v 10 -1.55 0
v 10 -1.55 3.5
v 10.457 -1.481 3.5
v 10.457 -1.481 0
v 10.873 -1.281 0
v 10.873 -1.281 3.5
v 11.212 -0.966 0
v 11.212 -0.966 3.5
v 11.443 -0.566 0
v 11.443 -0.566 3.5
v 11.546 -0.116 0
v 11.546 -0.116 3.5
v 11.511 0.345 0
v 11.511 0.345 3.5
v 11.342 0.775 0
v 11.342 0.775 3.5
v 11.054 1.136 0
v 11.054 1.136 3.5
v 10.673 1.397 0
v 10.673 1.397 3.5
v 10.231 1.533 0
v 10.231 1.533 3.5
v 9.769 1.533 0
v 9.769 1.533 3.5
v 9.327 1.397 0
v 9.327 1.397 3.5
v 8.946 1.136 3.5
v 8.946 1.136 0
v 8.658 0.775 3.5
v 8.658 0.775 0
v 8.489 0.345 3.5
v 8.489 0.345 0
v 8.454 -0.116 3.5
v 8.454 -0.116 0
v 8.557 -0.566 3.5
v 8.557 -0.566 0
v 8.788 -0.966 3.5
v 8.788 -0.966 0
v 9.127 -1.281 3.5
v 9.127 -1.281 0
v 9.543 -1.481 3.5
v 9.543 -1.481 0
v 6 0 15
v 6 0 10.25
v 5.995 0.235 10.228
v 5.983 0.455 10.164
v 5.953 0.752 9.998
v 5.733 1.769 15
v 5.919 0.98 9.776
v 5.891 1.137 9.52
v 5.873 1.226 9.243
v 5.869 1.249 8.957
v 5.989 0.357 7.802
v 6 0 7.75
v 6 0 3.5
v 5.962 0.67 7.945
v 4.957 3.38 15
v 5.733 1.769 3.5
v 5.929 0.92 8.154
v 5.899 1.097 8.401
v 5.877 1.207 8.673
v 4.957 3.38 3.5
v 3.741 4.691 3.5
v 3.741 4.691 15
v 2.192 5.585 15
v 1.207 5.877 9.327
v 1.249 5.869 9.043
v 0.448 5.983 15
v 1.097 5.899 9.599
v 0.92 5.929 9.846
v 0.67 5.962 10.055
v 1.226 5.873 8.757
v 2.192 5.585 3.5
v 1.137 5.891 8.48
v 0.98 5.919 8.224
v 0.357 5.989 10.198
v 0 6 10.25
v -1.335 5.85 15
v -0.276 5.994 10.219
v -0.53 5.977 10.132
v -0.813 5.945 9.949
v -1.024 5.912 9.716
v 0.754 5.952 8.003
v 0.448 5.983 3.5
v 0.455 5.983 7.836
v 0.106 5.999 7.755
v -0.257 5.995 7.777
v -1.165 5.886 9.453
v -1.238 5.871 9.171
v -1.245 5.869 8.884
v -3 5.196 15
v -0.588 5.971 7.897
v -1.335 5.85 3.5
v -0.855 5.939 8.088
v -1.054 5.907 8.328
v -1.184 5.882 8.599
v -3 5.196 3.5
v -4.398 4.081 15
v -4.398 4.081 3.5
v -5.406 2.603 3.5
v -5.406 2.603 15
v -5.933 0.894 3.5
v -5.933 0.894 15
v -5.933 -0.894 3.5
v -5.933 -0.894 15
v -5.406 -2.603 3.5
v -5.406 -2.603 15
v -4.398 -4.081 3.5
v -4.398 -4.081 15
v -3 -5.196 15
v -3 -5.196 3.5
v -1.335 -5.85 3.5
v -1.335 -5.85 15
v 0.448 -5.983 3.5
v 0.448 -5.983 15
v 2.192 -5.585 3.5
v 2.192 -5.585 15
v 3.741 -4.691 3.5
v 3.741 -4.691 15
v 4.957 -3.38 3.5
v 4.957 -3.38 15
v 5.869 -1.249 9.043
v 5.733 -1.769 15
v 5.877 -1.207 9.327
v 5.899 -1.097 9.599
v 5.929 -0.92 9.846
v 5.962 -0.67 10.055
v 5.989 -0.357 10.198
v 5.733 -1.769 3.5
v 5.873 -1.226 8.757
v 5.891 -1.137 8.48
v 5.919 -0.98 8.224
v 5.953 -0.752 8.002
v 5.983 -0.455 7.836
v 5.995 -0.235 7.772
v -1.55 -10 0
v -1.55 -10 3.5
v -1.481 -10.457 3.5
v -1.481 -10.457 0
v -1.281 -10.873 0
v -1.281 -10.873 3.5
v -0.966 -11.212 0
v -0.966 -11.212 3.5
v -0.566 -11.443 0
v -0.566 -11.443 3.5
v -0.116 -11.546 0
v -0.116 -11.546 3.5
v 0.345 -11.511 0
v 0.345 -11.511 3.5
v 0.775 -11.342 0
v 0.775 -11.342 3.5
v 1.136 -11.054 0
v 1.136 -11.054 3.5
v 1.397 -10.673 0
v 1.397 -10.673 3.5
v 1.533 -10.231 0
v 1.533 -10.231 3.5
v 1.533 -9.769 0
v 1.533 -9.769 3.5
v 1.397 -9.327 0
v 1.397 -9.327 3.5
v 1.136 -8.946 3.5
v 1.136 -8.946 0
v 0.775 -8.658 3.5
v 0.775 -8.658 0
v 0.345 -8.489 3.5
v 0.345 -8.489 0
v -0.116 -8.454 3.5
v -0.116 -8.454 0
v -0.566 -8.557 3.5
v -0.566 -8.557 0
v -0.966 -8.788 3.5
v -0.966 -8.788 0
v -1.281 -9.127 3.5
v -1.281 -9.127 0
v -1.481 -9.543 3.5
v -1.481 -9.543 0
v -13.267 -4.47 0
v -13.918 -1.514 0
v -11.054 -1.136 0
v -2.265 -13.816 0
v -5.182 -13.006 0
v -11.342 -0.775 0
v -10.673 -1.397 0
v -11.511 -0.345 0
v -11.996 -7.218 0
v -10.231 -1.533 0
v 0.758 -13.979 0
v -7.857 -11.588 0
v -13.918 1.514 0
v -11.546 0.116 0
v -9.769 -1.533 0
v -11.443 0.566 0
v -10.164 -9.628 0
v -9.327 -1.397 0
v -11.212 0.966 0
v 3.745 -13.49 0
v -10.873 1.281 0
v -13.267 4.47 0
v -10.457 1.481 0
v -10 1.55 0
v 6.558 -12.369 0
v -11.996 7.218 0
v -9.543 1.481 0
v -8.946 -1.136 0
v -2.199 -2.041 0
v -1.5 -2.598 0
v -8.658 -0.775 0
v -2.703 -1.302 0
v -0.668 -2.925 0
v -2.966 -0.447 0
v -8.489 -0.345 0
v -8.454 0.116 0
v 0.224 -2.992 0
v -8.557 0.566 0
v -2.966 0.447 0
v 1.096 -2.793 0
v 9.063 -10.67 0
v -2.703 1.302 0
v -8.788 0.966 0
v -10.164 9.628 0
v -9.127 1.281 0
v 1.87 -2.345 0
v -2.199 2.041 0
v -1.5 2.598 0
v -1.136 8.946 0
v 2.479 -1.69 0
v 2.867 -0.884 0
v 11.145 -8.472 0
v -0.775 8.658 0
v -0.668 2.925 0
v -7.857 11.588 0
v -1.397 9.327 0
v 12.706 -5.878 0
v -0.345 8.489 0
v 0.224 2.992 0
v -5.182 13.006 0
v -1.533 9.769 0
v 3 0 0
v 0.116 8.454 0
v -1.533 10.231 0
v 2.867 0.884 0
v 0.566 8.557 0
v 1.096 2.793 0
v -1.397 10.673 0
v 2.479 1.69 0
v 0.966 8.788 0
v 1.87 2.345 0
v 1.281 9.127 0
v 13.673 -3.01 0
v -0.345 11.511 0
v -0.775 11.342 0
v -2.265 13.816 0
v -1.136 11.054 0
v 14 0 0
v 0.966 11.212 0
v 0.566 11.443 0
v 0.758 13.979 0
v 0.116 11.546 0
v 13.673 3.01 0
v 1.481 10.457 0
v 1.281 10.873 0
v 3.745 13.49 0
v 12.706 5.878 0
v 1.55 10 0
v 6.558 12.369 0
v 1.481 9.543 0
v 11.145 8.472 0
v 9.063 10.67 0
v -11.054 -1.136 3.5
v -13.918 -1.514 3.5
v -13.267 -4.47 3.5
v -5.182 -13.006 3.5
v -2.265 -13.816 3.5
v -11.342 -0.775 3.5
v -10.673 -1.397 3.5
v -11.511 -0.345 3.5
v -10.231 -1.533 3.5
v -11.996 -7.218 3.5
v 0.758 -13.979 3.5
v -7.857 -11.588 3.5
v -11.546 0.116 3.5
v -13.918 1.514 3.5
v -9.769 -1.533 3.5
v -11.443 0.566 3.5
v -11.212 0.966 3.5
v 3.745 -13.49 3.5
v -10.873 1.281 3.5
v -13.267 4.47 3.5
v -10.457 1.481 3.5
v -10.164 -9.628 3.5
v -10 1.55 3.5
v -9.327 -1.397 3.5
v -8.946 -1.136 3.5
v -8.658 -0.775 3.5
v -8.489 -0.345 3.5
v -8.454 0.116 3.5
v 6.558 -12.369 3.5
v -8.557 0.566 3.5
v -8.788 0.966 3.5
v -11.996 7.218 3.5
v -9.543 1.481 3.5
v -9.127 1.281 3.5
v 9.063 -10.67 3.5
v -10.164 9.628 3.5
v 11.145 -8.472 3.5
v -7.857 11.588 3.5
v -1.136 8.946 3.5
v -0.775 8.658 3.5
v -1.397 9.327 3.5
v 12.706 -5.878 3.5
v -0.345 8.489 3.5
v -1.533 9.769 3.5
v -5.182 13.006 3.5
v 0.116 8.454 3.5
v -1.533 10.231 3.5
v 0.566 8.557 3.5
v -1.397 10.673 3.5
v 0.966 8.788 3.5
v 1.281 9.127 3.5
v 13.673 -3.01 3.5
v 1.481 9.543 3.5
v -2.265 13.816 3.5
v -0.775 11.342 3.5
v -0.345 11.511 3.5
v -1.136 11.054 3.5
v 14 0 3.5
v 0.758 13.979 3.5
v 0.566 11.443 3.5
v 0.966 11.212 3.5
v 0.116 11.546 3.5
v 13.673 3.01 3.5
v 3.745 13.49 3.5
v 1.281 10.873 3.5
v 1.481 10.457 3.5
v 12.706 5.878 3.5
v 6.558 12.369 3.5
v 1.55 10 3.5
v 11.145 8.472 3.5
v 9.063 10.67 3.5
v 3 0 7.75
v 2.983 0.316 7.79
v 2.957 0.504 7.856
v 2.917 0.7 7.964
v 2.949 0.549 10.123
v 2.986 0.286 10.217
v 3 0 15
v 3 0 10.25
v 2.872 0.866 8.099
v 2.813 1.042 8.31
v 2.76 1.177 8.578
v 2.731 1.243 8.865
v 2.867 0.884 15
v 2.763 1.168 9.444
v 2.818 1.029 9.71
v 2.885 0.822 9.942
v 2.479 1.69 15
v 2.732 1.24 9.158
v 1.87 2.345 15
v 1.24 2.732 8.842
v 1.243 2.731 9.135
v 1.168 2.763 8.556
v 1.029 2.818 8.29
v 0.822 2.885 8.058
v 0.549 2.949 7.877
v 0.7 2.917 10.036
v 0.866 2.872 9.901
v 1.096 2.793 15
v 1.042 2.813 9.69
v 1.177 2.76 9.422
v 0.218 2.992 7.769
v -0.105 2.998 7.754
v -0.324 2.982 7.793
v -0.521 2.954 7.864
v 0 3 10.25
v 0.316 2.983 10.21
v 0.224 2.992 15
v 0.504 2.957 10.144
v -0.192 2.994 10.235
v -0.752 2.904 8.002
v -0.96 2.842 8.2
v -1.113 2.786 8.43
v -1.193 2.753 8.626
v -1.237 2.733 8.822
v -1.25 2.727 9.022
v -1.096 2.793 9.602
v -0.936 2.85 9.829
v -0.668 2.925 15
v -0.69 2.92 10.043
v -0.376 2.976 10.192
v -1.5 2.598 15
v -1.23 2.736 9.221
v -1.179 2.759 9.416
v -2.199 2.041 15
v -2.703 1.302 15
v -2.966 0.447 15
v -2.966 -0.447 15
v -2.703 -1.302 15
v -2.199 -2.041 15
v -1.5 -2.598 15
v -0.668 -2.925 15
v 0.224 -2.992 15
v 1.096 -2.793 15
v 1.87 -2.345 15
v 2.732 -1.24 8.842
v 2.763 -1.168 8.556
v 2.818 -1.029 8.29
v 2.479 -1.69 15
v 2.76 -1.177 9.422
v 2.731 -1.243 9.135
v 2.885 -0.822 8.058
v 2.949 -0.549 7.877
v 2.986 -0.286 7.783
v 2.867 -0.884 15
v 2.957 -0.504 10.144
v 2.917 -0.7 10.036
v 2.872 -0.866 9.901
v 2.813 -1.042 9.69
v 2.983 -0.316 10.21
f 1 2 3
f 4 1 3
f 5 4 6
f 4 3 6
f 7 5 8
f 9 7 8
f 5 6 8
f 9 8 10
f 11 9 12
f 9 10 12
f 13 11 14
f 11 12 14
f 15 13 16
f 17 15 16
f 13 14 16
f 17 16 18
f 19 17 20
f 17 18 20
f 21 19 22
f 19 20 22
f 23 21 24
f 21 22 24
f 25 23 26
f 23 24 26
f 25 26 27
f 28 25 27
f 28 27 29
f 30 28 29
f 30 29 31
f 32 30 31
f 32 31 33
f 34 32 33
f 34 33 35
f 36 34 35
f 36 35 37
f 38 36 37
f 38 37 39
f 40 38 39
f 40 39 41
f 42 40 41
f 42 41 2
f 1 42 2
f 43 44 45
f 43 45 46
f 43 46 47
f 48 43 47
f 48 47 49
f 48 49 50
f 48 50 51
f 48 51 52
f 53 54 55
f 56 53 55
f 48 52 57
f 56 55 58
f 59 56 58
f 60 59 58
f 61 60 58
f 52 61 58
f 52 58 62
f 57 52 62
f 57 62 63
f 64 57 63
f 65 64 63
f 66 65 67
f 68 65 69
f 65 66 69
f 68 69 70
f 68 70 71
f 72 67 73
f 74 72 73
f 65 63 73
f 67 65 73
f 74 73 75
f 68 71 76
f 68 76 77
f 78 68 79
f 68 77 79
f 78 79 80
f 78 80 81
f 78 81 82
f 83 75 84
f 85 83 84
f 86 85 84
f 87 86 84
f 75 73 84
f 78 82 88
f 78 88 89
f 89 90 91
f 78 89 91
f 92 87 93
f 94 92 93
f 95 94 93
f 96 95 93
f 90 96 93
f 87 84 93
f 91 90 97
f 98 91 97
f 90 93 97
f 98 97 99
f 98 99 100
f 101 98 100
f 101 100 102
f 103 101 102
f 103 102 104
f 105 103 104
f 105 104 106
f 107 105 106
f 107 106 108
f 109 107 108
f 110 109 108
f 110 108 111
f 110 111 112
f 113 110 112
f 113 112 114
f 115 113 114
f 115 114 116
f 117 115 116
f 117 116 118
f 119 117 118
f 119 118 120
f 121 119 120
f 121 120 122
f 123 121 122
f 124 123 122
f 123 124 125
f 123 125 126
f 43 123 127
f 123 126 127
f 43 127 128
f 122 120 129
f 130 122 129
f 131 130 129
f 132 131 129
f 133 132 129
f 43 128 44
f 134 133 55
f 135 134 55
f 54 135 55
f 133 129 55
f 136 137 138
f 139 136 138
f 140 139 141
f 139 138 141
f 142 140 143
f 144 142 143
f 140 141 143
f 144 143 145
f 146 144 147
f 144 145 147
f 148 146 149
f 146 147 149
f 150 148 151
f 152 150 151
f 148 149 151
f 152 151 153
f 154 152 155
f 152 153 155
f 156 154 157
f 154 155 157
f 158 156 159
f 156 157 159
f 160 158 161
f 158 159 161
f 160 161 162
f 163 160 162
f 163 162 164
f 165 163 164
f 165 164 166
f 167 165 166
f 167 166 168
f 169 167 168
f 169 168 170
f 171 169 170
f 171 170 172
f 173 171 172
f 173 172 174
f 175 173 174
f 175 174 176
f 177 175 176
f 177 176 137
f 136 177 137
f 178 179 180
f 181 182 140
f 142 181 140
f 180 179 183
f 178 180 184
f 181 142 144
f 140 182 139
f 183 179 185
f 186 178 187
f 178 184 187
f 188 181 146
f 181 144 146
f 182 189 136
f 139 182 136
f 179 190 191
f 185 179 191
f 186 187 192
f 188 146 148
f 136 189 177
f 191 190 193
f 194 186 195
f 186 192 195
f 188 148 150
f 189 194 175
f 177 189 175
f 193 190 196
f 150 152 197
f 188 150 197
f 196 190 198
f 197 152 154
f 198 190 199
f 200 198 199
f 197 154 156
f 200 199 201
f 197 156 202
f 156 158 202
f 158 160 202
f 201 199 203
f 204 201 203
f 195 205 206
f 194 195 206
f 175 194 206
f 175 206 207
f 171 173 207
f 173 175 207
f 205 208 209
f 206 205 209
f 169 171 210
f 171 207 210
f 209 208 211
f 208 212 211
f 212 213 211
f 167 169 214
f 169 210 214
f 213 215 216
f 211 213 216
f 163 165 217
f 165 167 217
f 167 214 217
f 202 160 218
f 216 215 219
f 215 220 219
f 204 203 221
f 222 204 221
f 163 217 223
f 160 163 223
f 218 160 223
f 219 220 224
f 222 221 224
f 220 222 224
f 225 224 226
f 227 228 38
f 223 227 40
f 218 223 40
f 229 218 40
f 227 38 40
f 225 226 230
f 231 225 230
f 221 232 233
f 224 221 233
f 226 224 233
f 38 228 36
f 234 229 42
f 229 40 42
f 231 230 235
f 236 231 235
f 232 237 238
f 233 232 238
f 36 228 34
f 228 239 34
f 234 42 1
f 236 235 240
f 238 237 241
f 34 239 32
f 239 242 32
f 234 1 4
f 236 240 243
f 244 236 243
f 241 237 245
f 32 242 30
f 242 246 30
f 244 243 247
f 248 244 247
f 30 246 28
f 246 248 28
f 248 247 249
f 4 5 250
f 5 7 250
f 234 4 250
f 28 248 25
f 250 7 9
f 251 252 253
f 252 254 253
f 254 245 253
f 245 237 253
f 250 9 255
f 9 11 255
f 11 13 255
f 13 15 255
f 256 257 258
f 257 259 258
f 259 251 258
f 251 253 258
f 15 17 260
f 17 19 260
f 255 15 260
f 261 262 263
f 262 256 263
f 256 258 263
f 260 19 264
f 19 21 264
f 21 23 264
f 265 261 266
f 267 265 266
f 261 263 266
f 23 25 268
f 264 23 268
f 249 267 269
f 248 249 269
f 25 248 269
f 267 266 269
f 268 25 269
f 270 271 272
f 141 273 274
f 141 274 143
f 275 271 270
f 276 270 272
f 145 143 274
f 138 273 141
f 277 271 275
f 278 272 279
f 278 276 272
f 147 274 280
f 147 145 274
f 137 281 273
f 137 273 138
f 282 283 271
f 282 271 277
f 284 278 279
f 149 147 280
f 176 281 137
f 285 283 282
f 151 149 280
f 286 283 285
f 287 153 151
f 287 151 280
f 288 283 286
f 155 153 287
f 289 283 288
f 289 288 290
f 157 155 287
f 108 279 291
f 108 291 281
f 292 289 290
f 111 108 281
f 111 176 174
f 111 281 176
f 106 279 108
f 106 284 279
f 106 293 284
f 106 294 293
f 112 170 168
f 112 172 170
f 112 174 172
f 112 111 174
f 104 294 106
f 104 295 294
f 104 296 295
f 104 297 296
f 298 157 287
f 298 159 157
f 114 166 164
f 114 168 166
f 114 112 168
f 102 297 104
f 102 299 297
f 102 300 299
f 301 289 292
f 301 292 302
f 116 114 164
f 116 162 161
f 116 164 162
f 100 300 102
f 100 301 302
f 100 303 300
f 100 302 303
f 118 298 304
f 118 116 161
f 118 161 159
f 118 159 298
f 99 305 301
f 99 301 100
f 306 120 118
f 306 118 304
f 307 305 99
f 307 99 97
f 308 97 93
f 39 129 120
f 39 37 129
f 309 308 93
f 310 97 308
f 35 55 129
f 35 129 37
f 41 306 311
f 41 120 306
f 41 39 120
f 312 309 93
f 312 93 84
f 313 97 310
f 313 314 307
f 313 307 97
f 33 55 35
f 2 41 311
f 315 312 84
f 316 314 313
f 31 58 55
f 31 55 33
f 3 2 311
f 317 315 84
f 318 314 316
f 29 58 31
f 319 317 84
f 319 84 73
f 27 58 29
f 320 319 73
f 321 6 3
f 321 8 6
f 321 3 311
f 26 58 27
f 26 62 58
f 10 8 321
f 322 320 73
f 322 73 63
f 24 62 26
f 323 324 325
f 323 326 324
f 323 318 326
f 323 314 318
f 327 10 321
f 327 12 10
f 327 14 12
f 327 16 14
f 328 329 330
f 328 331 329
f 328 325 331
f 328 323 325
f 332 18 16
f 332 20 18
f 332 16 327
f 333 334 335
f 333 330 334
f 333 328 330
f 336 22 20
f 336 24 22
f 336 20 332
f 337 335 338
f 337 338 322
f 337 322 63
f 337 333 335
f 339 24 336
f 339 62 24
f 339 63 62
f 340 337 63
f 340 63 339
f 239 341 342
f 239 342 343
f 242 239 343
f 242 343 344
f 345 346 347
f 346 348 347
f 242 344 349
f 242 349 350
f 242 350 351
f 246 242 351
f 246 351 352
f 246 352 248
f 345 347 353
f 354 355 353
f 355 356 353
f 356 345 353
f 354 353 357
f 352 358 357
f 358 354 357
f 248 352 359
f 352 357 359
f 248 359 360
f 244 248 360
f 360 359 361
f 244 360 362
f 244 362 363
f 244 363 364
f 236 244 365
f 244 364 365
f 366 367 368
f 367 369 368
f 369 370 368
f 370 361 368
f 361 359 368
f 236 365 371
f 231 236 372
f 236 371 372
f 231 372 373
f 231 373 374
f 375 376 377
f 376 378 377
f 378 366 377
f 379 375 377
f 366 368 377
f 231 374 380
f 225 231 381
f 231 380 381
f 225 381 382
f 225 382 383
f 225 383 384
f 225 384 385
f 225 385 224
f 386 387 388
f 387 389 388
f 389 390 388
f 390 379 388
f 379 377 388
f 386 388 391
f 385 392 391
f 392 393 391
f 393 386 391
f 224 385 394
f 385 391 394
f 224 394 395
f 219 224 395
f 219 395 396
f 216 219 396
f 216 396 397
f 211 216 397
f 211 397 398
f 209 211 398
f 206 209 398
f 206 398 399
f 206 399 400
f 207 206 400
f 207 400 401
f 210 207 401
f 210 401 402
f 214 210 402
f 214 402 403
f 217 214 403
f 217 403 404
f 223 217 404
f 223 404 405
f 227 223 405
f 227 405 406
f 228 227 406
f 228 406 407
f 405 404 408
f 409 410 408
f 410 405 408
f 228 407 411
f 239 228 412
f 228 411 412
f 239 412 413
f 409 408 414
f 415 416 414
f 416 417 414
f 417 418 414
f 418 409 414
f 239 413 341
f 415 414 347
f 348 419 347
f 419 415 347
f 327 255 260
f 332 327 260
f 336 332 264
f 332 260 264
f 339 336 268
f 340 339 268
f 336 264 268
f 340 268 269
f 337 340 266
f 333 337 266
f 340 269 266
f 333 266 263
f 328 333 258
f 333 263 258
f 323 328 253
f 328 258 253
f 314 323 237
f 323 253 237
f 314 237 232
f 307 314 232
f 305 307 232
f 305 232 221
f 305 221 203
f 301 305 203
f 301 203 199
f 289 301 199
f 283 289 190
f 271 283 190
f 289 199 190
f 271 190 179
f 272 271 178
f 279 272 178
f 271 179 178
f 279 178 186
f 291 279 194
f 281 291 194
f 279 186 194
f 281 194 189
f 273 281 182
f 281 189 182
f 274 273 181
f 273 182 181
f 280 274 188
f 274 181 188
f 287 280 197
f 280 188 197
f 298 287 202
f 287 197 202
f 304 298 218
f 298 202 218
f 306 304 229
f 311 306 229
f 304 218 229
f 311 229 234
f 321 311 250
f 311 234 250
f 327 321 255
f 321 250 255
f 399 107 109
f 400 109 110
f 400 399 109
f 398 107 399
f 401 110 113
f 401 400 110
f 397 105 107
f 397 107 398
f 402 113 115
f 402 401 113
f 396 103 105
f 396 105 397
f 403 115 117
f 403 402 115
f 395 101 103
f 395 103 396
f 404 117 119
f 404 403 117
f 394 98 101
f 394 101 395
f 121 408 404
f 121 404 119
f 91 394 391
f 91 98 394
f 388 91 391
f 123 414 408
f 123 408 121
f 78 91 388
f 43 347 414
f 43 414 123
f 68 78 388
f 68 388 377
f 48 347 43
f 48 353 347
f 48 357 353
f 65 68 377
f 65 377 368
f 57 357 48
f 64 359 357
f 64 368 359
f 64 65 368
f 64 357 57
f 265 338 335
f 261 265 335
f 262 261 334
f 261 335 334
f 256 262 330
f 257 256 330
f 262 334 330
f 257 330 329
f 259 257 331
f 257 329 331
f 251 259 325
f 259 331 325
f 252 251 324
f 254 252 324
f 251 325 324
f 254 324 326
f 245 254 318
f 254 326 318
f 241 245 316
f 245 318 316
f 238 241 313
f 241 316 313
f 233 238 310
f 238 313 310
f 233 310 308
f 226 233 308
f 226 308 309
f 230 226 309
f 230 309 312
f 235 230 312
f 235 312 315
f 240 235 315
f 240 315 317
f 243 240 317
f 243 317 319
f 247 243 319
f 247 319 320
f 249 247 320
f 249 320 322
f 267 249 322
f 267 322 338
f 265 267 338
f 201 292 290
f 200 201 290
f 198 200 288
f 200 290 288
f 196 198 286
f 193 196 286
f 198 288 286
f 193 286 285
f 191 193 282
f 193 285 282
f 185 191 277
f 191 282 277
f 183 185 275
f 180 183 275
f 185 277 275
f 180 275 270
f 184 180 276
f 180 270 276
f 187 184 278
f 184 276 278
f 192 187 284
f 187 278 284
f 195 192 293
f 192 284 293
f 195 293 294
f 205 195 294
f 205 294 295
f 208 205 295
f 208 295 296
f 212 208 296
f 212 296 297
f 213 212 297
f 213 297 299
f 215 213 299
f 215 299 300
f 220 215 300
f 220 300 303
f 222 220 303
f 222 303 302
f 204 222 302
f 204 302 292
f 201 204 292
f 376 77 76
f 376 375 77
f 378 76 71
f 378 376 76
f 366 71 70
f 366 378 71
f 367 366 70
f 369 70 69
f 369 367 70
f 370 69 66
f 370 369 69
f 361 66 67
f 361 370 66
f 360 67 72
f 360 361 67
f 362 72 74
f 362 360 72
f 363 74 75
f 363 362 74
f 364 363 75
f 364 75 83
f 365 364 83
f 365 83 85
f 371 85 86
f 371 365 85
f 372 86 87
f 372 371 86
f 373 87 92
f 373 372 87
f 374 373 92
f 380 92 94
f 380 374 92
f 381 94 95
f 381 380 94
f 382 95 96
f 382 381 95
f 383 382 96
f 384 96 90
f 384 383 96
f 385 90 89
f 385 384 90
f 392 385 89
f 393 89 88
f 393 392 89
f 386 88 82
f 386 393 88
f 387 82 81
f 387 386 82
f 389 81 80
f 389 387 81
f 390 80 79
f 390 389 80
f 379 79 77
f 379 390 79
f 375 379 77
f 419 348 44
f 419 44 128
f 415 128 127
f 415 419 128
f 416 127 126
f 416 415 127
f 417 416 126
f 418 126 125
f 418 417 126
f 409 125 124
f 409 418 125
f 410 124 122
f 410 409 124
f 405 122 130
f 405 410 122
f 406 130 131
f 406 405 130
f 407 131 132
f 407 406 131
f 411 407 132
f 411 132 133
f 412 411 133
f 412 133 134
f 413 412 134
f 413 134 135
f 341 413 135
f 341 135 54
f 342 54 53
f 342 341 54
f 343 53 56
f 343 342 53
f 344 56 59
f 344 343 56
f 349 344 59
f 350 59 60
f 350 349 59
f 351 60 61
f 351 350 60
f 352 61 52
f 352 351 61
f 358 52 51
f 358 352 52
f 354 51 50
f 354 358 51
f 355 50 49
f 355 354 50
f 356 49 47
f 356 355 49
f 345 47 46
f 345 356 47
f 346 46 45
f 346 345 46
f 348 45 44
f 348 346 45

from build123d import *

# Parameters (mm, degrees)
SKETCH_1_R               = 14
EXTRUDE_1_DEPTH          = 3.5
SKETCH_2_R               = 6
EXTRUDE_2_DEPTH          = 11.5
SKETCH_3_R               = 3
CUT_EXTRUDE_1_DEPTH      = 25.839484697
SKETCH_4_R               = 1.55
CUT_EXTRUDE_2_DEPTH      = 23.896506284
PATTERN_CIRCULAR_1_COUNT = 4
PATTERN_CIRCULAR_2_COUNT = 2
PATTERN_CIRCULAR_2_ANGLE = 90


with BuildPart() as part:
    # 草图1 → 凸台-拉伸1 (new body)
    with BuildSketch(Plane.XY):
        Circle(SKETCH_1_R)
    extrude(amount=EXTRUDE_1_DEPTH)

    # 草图2 → 凸台-拉伸2 (add)
    with BuildSketch(Plane.XY.offset(3.5)):
        Circle(SKETCH_2_R)
    extrude(amount=EXTRUDE_2_DEPTH)

    # 草图3 → 切除-拉伸1 (cut, through all)
    with BuildSketch(Plane.XY.offset(15)):
        Circle(SKETCH_3_R)
    extrude(amount=-CUT_EXTRUDE_1_DEPTH, mode=Mode.SUBTRACT)

    # 草图4 → 切除-拉伸2 (cut, through all)
    with BuildSketch(Plane.XY.offset(3.5)):
        with Locations((0, 10)):
            Circle(SKETCH_4_R)
    cut_extrude_2 = extrude(amount=-CUT_EXTRUDE_2_DEPTH, mode=Mode.SUBTRACT)

    # 阵列(圆周)1: 切除-拉伸2 ×4 about axis
    pattern_circular_1_axis = Axis((0, 0, 0), (0, 0, 1))
    for i in range(1, PATTERN_CIRCULAR_1_COUNT):
        add(cut_extrude_2.rotate(pattern_circular_1_axis, i * 360 / PATTERN_CIRCULAR_1_COUNT), mode=Mode.SUBTRACT)

    # 草图6 → M3 螺纹孔1 (revolve, cut)
    with BuildSketch(Plane(origin=(0, 0, 9), x_dir=(0, 0, 1), z_dir=(0, 1, 0))):
        Polygon((0, 0), (0, 8.251075774), (1.25, 7.5), (1.25, 0.275), (1.525, 0), align=None)
    hole_wizard_m3_1 = revolve(axis=Axis((-6.35, 0, 9), (1, 0, 0)), mode=Mode.SUBTRACT)

    # 阵列(圆周)2: M3 螺纹孔1 ×2 about axis
    pattern_circular_2_axis = Axis((0, 0, 15), (0, 0, 1))
    for i in range(1, PATTERN_CIRCULAR_2_COUNT):
        add(hole_wizard_m3_1.rotate(pattern_circular_2_axis, i * PATTERN_CIRCULAR_2_ANGLE / (PATTERN_CIRCULAR_2_COUNT - 1)), mode=Mode.SUBTRACT)


solid = part.part
